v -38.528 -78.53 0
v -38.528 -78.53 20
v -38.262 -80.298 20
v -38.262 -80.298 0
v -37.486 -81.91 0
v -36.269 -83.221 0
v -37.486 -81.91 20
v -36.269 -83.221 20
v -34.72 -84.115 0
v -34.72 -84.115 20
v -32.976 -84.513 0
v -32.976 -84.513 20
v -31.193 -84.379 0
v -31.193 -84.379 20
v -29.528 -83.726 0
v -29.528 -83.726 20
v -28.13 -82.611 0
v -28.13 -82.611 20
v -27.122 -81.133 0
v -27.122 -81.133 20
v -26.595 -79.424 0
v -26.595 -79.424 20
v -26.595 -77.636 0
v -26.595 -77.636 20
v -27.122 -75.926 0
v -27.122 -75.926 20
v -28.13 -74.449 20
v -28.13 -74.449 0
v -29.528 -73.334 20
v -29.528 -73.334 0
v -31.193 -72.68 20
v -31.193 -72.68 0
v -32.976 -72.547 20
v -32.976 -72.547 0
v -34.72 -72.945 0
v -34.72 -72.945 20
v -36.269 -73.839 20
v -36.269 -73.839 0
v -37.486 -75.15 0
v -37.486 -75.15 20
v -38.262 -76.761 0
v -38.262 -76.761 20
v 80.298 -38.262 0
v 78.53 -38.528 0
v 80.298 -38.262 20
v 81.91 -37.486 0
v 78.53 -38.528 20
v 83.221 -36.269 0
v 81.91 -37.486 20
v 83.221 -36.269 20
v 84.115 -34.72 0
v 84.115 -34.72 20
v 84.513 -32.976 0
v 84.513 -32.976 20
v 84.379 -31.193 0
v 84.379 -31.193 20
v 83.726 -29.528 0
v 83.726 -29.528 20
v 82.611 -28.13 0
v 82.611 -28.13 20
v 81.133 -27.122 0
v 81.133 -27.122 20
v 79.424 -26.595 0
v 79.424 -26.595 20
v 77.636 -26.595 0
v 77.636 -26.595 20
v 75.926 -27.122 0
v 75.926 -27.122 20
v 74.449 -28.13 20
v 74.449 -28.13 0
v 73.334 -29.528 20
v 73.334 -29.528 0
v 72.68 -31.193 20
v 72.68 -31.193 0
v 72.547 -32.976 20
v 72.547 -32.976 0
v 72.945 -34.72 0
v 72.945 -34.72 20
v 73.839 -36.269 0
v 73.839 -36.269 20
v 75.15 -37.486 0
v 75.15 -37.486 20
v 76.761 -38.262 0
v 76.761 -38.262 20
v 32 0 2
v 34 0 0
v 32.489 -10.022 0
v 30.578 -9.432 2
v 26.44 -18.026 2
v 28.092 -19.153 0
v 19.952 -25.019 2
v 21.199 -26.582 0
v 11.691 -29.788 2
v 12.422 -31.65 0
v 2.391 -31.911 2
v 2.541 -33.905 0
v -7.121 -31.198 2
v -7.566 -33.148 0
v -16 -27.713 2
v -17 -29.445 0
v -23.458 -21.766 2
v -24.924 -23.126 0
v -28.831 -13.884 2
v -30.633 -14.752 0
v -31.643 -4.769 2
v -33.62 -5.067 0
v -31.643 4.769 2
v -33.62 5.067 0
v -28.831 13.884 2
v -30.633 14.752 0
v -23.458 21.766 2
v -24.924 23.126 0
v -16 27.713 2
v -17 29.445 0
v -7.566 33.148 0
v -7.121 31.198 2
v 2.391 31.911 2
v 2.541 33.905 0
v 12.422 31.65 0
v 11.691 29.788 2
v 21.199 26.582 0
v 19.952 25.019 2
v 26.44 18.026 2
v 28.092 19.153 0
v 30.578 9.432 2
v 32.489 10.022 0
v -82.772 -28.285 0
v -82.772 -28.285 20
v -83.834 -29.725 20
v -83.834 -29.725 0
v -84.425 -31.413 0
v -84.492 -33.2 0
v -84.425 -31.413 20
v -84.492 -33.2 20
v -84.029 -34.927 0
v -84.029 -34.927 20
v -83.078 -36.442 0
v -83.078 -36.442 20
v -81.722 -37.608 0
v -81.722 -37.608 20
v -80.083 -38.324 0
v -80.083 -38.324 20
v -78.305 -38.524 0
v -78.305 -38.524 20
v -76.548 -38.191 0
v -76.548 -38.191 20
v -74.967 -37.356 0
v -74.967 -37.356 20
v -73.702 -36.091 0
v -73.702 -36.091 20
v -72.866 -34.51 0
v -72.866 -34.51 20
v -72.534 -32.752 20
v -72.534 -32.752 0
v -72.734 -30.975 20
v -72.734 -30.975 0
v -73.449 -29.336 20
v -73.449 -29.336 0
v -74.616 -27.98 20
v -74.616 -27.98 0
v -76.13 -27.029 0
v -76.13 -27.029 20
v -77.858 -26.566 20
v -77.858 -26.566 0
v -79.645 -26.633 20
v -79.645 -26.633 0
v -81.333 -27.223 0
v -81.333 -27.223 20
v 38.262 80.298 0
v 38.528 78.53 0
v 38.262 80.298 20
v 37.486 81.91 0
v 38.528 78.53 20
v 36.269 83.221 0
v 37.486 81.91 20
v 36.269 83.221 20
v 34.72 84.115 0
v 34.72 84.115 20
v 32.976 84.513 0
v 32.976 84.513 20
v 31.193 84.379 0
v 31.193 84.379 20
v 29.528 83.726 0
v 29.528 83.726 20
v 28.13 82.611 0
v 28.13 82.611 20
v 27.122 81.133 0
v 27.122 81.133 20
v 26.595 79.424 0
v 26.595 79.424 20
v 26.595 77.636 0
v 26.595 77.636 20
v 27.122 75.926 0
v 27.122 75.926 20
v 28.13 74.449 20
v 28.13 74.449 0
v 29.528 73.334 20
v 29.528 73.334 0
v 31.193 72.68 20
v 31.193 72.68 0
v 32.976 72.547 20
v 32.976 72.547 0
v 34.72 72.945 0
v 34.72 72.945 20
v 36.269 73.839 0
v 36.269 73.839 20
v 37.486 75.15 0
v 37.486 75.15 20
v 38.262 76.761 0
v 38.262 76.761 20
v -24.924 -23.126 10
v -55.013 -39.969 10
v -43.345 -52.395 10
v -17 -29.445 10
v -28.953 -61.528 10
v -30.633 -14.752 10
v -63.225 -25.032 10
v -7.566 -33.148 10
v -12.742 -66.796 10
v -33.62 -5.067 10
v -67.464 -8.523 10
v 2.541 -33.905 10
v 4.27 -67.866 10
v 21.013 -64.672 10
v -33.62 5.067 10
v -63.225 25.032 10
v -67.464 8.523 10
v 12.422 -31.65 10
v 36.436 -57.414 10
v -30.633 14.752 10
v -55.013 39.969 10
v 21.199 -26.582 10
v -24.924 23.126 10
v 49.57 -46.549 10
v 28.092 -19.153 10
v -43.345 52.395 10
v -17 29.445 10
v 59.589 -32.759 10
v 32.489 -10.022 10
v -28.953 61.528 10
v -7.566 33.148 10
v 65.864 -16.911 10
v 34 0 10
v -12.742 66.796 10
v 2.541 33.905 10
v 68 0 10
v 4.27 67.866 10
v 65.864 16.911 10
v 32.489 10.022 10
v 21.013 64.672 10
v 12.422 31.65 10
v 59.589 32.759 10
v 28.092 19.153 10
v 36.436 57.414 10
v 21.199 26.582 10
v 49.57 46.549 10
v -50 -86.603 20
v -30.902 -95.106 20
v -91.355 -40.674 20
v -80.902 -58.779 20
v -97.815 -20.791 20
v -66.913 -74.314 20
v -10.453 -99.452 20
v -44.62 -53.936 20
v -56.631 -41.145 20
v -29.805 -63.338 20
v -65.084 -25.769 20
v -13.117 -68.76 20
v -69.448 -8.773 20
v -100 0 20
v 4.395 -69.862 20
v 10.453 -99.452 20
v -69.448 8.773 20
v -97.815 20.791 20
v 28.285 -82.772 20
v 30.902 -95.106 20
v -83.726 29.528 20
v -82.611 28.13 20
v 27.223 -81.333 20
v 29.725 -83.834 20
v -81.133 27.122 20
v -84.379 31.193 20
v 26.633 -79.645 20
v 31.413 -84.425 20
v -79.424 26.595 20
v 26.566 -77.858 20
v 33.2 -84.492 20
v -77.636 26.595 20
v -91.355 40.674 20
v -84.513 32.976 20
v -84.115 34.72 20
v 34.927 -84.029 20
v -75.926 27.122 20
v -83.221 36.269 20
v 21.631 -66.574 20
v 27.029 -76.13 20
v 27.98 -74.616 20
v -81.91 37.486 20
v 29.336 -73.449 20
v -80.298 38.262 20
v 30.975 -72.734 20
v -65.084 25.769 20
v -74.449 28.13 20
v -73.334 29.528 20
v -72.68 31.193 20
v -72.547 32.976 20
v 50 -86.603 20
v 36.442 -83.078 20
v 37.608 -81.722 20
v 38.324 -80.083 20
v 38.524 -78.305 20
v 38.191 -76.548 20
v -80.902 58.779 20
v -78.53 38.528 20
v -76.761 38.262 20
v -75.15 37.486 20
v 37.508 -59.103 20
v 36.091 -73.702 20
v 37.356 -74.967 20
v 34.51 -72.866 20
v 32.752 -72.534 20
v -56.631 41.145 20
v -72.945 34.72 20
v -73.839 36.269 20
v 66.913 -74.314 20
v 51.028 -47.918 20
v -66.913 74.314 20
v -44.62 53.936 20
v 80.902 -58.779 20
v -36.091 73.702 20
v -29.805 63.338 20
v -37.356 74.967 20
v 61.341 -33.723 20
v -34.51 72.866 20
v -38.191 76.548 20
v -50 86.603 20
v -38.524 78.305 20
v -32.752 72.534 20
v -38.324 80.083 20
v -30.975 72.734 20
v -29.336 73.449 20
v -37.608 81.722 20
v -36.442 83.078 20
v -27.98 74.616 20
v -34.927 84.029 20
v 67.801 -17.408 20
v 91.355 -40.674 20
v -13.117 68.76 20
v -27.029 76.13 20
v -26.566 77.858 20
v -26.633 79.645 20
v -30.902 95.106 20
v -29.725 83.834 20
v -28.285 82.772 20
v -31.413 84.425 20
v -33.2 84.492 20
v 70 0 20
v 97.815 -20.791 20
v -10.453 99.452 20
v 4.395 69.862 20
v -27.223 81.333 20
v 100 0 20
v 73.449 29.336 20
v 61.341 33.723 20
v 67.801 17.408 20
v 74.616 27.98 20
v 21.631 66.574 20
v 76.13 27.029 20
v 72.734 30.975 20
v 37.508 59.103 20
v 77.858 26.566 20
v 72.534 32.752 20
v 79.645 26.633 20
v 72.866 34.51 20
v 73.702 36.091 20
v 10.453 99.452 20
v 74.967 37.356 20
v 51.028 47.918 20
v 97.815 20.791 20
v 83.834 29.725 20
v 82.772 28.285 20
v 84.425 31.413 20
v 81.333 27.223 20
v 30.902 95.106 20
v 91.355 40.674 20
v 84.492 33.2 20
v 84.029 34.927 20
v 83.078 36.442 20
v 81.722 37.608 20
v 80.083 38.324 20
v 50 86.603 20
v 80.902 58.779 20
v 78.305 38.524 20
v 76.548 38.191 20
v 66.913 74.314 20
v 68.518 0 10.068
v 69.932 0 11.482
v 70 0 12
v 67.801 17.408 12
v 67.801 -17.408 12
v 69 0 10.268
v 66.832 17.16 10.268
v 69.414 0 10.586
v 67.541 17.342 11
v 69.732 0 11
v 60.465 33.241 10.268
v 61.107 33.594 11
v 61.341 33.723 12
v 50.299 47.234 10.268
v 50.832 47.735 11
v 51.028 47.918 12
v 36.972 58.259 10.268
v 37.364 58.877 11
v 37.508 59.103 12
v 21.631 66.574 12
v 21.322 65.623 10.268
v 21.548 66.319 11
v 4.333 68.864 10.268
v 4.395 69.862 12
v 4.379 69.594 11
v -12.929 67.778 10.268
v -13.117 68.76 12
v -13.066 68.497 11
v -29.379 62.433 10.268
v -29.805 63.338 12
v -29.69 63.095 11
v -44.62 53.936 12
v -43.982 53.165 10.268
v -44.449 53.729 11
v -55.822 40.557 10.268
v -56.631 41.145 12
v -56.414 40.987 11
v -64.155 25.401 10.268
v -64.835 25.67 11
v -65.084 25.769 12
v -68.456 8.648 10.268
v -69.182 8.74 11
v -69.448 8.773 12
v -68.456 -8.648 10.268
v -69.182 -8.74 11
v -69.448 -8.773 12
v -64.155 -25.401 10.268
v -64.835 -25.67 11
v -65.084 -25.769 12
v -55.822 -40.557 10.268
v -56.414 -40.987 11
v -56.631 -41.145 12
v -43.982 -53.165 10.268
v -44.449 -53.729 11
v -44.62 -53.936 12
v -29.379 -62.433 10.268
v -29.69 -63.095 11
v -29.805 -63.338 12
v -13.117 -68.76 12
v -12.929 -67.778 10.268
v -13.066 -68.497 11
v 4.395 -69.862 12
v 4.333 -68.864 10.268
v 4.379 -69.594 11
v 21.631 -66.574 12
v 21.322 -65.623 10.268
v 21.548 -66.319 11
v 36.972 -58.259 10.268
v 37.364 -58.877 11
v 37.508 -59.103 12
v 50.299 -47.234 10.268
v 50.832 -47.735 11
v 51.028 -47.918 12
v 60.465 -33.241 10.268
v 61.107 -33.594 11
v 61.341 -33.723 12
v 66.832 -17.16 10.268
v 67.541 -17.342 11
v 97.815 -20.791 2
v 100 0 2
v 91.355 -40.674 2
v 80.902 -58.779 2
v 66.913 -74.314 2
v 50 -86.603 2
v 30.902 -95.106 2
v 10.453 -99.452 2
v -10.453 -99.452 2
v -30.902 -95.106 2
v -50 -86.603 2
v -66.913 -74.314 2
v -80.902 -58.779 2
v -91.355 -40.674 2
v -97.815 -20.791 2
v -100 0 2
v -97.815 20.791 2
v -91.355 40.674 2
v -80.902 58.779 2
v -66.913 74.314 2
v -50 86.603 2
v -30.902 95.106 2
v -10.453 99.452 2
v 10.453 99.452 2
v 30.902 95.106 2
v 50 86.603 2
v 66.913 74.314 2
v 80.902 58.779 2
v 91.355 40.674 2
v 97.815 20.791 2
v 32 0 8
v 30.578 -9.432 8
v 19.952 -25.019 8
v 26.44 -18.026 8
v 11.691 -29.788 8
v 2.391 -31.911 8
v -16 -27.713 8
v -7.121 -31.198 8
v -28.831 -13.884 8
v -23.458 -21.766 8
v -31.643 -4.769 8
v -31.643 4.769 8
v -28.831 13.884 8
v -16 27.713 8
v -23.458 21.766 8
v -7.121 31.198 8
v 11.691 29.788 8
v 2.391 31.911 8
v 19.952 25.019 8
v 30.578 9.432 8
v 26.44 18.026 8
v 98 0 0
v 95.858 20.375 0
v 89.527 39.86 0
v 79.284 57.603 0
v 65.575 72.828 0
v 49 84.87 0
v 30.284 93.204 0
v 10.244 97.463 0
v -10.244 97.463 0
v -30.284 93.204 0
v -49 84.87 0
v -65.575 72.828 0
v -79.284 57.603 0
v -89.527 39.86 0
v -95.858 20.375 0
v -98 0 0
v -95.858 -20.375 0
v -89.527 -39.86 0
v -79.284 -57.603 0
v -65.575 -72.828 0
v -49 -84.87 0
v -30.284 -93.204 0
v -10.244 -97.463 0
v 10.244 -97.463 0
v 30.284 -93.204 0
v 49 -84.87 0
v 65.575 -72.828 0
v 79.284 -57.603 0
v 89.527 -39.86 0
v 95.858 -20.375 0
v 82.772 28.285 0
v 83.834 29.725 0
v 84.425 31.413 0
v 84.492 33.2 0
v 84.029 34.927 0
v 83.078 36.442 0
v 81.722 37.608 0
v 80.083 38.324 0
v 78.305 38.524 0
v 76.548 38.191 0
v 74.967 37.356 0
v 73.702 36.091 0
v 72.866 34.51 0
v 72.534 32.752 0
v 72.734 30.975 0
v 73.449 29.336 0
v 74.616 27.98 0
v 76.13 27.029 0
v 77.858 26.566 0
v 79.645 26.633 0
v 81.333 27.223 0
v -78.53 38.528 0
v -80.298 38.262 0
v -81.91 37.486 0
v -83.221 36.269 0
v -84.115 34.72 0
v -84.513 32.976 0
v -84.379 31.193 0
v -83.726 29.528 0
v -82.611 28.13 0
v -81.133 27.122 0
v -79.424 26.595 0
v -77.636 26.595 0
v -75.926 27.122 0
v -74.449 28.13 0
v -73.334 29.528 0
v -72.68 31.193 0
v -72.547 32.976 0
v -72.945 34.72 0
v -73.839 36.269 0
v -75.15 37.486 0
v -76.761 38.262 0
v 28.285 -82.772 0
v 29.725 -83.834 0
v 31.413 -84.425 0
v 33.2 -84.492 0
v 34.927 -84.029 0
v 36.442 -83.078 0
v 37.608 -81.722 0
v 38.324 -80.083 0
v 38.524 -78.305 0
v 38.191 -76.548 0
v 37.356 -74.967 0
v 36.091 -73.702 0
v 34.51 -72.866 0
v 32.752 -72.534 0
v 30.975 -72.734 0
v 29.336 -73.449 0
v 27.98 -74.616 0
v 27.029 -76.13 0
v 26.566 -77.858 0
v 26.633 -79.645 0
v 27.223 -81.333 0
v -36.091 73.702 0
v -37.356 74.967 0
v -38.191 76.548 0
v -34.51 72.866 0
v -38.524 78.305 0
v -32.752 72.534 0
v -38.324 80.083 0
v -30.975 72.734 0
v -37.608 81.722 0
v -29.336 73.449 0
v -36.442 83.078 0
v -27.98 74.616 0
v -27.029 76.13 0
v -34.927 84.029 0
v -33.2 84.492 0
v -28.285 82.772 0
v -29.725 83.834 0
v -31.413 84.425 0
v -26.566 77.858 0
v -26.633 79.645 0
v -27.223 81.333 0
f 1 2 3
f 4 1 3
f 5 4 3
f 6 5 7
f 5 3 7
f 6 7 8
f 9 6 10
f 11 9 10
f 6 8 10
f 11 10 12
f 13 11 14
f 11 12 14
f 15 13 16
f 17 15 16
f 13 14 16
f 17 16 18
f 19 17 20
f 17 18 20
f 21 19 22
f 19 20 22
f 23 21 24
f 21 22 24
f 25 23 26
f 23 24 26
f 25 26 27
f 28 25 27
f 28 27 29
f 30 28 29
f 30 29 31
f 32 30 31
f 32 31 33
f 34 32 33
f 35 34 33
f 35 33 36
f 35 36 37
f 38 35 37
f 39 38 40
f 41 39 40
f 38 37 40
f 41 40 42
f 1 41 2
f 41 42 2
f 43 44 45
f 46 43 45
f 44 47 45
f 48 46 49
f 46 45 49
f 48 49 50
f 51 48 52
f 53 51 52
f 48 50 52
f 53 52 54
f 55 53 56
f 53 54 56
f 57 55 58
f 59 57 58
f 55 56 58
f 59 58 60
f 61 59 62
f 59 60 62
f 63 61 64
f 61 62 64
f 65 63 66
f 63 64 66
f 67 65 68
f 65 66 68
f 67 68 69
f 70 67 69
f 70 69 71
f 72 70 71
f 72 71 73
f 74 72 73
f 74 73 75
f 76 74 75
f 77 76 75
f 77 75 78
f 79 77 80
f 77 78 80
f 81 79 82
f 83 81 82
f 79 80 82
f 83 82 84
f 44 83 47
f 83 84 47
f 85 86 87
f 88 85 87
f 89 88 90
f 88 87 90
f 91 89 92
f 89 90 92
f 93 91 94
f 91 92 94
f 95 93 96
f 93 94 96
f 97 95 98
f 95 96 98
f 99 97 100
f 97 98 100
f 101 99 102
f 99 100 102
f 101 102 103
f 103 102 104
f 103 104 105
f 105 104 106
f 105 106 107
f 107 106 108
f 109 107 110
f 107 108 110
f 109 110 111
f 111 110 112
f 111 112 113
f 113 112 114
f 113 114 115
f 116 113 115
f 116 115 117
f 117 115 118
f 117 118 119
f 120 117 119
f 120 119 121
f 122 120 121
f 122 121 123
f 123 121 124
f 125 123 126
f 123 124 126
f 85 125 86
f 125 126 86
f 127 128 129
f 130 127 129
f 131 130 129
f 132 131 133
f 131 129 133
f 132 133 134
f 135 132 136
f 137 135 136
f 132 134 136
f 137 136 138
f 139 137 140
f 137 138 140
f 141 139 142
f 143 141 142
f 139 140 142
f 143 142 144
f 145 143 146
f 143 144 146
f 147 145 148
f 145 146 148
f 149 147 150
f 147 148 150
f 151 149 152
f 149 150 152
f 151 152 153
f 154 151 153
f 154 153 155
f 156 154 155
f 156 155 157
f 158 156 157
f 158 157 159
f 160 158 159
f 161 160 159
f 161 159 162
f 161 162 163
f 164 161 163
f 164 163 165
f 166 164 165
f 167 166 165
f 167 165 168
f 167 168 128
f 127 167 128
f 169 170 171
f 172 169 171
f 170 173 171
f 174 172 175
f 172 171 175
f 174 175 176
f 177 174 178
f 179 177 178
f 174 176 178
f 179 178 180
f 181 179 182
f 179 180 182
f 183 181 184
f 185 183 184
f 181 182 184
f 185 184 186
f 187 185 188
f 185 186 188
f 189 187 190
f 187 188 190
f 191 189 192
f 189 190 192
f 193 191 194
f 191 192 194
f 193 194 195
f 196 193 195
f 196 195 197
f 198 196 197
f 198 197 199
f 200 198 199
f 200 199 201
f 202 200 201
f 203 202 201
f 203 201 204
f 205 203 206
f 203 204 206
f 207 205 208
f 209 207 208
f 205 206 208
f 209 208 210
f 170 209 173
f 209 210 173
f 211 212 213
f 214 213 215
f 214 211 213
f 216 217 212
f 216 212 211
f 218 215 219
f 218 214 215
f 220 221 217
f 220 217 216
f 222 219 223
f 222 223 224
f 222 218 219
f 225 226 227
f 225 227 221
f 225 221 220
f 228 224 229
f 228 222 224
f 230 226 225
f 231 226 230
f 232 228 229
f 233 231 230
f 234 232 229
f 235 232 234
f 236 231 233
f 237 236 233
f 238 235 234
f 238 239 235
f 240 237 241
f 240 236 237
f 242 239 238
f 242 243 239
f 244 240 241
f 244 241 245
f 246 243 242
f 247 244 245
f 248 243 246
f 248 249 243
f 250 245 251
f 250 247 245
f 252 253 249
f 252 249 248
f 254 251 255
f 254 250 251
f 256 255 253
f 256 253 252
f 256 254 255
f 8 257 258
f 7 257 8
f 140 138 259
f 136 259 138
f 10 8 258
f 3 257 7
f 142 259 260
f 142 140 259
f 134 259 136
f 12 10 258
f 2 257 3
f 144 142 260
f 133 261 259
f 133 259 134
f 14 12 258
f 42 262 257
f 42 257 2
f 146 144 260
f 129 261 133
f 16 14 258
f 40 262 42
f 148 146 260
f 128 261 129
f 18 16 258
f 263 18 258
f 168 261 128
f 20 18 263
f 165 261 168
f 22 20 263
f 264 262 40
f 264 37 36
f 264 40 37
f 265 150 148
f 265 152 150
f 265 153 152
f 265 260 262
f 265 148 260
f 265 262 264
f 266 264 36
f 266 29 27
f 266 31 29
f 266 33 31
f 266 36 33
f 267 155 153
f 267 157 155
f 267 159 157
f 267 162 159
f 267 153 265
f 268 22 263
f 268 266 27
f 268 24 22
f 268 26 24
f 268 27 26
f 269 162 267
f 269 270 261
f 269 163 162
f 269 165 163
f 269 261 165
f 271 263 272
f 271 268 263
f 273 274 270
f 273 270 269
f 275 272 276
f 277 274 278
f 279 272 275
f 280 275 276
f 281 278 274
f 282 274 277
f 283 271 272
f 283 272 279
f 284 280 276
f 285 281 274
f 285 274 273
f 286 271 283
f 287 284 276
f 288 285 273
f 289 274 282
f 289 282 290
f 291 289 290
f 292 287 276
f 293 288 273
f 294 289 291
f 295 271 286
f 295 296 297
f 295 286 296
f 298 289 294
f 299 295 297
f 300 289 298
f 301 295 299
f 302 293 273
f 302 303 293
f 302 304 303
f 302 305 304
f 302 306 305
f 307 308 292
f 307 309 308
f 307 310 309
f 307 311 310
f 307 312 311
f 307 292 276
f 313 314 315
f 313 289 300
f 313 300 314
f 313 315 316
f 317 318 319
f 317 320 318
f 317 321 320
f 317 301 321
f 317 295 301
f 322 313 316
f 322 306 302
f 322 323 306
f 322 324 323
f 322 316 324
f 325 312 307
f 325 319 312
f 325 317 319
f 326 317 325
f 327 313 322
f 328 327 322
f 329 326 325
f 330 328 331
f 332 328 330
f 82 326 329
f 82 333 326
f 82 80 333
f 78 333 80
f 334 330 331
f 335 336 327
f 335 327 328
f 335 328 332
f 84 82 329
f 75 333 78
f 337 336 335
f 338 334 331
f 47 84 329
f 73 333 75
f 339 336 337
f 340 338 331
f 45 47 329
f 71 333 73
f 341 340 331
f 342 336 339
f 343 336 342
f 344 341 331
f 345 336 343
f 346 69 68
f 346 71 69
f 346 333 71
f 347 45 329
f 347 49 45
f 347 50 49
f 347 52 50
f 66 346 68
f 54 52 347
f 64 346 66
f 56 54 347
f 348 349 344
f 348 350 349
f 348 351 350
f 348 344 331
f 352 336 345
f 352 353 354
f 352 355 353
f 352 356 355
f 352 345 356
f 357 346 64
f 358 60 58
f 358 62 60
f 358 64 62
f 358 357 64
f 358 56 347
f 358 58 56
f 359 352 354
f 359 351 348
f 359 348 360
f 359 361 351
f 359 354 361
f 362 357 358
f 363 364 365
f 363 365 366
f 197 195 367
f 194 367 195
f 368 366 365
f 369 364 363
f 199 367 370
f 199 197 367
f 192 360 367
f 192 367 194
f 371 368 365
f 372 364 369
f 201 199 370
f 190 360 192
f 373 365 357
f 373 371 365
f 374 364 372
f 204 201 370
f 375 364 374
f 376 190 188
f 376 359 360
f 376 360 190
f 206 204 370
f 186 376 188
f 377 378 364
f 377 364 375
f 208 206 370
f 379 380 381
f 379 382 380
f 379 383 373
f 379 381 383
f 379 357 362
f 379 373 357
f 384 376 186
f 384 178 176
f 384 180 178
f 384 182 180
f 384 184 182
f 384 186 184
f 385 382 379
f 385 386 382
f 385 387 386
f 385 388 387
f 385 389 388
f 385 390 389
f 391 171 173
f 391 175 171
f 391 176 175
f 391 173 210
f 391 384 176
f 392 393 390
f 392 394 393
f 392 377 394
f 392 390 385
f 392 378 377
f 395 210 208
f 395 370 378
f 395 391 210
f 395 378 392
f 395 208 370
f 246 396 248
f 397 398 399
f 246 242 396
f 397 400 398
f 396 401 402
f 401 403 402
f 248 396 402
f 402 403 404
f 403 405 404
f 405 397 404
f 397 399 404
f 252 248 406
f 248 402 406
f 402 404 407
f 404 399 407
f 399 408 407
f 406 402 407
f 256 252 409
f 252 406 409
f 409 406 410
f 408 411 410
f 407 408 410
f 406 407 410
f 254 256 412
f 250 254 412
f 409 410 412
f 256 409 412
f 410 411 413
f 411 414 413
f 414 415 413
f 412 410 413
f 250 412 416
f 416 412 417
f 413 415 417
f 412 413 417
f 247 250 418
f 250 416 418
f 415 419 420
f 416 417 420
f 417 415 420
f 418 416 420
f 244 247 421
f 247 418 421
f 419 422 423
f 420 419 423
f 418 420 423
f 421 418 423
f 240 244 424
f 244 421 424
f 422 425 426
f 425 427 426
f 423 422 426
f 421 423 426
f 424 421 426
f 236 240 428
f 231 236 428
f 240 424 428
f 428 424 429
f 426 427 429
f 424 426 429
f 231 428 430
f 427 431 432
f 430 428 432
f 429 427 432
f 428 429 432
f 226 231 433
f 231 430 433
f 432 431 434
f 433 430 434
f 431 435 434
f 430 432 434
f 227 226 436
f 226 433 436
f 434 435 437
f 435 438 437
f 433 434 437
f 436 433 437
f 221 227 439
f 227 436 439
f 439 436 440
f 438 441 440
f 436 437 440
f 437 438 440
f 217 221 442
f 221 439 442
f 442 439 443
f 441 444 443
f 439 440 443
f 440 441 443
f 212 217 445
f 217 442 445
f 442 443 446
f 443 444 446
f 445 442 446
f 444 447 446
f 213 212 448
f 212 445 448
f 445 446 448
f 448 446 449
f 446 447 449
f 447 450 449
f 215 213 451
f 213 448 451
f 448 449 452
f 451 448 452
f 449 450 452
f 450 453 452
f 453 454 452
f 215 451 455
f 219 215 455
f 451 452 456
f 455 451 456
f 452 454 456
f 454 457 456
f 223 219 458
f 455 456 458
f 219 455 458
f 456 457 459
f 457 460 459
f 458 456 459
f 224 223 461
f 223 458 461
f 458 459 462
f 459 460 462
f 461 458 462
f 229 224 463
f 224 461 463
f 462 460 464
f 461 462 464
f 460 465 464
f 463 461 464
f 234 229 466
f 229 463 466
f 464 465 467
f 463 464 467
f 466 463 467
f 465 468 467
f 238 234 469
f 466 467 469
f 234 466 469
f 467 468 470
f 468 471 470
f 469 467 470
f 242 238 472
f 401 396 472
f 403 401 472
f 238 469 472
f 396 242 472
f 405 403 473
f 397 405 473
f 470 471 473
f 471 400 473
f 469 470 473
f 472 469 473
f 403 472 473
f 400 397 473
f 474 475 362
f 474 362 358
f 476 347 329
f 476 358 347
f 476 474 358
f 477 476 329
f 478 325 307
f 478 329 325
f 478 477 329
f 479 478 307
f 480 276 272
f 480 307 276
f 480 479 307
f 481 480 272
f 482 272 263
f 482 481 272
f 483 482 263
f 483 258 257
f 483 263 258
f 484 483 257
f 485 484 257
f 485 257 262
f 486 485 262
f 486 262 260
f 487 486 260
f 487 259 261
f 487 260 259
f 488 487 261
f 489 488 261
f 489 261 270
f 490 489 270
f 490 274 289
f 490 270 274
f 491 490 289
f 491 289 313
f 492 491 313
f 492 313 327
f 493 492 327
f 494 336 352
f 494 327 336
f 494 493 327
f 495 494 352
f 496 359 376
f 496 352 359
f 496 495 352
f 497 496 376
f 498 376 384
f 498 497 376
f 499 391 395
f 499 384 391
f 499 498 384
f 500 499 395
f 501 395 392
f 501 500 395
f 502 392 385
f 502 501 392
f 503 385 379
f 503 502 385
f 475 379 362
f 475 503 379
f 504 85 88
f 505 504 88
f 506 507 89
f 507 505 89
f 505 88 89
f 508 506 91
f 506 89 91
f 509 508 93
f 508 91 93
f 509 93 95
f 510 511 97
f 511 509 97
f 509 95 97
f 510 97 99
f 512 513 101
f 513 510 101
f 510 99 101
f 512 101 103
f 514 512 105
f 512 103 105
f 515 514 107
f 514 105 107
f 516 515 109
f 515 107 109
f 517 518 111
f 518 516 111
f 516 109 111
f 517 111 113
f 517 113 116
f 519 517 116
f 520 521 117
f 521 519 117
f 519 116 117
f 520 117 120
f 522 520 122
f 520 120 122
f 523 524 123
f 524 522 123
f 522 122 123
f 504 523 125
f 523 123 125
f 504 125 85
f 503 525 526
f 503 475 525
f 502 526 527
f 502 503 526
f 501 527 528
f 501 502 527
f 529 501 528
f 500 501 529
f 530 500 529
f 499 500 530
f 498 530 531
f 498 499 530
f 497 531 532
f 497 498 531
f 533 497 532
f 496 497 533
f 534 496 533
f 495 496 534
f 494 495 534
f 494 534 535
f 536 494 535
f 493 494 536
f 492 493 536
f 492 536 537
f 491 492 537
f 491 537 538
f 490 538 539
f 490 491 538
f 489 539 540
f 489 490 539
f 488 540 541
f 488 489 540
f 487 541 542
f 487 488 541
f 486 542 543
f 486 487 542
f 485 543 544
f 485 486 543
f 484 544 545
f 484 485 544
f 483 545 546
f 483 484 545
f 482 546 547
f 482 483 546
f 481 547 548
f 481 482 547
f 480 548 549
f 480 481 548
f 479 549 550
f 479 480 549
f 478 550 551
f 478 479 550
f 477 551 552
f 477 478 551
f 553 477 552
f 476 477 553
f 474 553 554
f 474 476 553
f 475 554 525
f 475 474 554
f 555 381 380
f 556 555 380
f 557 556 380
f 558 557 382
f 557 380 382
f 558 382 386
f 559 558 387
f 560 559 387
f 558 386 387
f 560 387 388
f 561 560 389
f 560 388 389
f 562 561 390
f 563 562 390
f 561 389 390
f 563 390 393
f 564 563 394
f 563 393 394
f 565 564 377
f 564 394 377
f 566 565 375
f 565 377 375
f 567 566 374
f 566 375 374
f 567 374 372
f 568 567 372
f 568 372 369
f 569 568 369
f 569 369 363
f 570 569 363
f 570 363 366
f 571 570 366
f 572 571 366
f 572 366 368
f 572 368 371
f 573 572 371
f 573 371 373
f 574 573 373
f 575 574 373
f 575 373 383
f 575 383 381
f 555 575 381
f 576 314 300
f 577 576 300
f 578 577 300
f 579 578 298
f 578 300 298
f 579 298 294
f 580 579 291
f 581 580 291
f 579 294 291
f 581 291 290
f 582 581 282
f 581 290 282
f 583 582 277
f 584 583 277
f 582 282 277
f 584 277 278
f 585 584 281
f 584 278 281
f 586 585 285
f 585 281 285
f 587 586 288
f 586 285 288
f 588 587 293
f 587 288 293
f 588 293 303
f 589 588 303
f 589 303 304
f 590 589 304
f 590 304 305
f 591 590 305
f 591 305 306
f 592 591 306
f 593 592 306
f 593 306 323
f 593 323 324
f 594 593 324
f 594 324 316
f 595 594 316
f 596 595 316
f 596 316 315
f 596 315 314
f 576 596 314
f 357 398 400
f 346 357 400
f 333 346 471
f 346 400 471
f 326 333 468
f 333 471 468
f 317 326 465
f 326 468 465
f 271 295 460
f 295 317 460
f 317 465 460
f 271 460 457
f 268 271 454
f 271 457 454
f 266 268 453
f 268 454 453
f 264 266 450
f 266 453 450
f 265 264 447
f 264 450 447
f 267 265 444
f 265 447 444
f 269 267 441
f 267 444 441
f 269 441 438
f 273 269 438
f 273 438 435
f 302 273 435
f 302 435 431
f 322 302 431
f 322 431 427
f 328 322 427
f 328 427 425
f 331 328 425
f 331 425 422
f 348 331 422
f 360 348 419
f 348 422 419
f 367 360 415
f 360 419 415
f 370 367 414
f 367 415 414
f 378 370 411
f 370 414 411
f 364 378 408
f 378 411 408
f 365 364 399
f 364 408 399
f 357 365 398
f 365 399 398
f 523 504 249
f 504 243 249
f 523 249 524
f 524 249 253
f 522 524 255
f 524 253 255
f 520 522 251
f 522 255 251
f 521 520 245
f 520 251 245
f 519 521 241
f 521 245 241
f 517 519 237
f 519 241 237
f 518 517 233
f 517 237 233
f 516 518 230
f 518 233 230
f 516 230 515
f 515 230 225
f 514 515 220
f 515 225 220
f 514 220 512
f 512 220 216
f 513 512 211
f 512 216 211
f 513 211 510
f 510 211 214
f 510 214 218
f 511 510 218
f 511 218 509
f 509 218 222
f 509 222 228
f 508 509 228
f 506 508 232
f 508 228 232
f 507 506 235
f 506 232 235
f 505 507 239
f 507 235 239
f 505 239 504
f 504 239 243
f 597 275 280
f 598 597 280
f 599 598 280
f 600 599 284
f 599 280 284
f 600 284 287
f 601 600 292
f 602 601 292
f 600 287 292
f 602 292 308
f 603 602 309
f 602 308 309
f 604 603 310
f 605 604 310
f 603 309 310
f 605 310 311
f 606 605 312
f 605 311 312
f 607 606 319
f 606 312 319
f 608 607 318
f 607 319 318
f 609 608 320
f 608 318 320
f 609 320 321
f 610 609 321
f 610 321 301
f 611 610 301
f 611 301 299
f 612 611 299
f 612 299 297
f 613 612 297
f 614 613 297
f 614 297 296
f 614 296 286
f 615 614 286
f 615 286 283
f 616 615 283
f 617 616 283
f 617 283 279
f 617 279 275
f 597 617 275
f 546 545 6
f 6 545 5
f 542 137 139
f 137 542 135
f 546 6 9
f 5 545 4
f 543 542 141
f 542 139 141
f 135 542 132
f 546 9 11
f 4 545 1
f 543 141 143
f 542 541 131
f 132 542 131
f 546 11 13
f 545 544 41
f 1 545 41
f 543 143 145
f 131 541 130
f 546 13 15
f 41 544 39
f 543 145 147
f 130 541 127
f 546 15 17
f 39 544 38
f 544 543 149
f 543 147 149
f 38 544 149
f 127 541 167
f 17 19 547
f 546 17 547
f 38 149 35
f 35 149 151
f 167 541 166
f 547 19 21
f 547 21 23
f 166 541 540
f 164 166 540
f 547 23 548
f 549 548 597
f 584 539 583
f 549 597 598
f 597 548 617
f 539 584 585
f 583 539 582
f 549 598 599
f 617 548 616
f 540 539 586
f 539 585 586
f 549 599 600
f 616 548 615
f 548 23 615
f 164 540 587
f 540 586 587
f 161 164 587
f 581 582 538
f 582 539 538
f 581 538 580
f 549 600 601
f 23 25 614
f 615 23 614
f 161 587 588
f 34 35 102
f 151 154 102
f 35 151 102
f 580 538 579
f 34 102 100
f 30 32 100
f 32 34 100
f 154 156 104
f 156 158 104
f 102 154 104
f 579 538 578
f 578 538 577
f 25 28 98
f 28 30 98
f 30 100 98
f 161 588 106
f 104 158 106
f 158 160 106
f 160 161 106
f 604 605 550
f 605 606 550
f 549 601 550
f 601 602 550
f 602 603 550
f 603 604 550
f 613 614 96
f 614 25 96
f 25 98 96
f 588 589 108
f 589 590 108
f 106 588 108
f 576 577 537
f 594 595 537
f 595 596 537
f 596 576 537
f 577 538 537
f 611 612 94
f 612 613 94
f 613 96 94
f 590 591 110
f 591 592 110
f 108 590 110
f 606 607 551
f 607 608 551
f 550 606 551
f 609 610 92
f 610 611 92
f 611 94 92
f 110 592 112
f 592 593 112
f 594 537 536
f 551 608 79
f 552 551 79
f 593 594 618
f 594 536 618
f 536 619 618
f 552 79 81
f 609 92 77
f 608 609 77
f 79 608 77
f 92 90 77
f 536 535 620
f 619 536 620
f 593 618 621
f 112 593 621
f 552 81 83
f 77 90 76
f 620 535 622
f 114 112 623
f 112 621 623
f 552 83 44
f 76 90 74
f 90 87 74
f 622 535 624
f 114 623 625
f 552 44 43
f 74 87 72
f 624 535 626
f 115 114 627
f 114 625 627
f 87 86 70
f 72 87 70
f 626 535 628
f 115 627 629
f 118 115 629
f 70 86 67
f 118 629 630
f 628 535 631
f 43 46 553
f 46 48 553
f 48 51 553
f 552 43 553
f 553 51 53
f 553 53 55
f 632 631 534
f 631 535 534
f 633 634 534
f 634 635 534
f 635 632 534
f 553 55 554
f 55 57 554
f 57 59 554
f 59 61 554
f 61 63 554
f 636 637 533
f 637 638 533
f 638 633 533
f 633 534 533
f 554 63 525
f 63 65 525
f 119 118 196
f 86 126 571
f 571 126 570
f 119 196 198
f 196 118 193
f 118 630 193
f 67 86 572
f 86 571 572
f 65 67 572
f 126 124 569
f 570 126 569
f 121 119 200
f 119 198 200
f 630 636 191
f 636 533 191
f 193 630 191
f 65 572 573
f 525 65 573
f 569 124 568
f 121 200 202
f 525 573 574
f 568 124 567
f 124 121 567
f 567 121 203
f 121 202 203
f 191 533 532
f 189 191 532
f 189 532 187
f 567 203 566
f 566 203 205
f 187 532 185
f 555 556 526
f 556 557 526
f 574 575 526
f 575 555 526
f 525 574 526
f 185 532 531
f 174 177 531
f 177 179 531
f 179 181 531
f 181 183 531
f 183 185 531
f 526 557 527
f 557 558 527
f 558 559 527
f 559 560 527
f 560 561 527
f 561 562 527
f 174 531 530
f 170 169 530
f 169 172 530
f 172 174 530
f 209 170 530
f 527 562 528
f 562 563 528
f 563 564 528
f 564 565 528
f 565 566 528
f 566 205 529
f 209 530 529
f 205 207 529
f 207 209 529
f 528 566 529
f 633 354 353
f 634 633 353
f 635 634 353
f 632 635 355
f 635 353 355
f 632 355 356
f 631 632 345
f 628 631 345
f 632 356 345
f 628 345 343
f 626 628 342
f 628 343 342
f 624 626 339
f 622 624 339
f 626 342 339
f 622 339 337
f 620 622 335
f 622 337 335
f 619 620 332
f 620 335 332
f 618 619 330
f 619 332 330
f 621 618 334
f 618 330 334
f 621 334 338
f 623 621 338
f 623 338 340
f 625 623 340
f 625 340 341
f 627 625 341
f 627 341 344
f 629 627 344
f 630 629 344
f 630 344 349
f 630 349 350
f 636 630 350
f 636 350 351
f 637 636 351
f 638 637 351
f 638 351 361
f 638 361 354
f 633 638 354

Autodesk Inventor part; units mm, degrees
ref_plane "YZ Plane" through (0, 0, 0) normal (1, 0, 0) x (0, 1, 0)
ref_plane "XZ Plane" through (0, 0, 0) normal (0, 1, 0) x (-1, 0, 0)
ref_plane "XY Plane" through (0, 0, 0) normal (0, 0, 1) x (1, 0, 0)
sketch "Эскиз1" plane through (0, 0, 0) normal (0, 0, 1) x (1, 0, 0)
  circle A0 centre (0, 0) radius 32
  circle A1 centre (0, 0) radius 100
  dimension "d0" = 64
  dimension "d1" = 200
extrude "Выдавливание1" add sketch "Эскиз1" along normal blind 10
sketch "Эскиз2" plane through (0, 0, 10) normal (0, 0, 1) x (1, 0, 0)
  circle A0 centre (0, 0) radius 100 projected
  circle A1 centre (0, 0) radius 70
  dimension "d4" = 140
extrude "Выдавливание2" add sketch "Эскиз2" along normal blind 10
fillet "Сопряжение1" radius 2 1 edges at (-70, 0, 10)
chamfer "Фаска1" distance 2 angle 45 2 edges at (-32, 0, 10) (-32, 0, 0)
sketch "Эскиз3" plane through (0, 0, 0) normal (0, 0, -1) x (-1, 0, 0)
  circle A0 centre (0, 0) radius 100 projected
  line L0 (0, 0) -> (78.5298, 32.5281)
  line L1 (140, 0) -> (-140, 0) projected
  dimension "d11" = 85
  dimension "d12" = 22.5
hole "Отверстие1" at (-78.5298, 32.5281, 0) direction (0, 0, 1) diameter 12 end through all
pattern_circular "Круговой массив1" count 8 over 360 about axis through (0, 0, 1) along (0, 0, 1) of "Отверстие1"
chamfer "Фаска2" distance 2 angle 45 1 edges at (-100, 0, 0)
properties part number "Крышка перегородки12_CPY" material "Чугун, серый"
